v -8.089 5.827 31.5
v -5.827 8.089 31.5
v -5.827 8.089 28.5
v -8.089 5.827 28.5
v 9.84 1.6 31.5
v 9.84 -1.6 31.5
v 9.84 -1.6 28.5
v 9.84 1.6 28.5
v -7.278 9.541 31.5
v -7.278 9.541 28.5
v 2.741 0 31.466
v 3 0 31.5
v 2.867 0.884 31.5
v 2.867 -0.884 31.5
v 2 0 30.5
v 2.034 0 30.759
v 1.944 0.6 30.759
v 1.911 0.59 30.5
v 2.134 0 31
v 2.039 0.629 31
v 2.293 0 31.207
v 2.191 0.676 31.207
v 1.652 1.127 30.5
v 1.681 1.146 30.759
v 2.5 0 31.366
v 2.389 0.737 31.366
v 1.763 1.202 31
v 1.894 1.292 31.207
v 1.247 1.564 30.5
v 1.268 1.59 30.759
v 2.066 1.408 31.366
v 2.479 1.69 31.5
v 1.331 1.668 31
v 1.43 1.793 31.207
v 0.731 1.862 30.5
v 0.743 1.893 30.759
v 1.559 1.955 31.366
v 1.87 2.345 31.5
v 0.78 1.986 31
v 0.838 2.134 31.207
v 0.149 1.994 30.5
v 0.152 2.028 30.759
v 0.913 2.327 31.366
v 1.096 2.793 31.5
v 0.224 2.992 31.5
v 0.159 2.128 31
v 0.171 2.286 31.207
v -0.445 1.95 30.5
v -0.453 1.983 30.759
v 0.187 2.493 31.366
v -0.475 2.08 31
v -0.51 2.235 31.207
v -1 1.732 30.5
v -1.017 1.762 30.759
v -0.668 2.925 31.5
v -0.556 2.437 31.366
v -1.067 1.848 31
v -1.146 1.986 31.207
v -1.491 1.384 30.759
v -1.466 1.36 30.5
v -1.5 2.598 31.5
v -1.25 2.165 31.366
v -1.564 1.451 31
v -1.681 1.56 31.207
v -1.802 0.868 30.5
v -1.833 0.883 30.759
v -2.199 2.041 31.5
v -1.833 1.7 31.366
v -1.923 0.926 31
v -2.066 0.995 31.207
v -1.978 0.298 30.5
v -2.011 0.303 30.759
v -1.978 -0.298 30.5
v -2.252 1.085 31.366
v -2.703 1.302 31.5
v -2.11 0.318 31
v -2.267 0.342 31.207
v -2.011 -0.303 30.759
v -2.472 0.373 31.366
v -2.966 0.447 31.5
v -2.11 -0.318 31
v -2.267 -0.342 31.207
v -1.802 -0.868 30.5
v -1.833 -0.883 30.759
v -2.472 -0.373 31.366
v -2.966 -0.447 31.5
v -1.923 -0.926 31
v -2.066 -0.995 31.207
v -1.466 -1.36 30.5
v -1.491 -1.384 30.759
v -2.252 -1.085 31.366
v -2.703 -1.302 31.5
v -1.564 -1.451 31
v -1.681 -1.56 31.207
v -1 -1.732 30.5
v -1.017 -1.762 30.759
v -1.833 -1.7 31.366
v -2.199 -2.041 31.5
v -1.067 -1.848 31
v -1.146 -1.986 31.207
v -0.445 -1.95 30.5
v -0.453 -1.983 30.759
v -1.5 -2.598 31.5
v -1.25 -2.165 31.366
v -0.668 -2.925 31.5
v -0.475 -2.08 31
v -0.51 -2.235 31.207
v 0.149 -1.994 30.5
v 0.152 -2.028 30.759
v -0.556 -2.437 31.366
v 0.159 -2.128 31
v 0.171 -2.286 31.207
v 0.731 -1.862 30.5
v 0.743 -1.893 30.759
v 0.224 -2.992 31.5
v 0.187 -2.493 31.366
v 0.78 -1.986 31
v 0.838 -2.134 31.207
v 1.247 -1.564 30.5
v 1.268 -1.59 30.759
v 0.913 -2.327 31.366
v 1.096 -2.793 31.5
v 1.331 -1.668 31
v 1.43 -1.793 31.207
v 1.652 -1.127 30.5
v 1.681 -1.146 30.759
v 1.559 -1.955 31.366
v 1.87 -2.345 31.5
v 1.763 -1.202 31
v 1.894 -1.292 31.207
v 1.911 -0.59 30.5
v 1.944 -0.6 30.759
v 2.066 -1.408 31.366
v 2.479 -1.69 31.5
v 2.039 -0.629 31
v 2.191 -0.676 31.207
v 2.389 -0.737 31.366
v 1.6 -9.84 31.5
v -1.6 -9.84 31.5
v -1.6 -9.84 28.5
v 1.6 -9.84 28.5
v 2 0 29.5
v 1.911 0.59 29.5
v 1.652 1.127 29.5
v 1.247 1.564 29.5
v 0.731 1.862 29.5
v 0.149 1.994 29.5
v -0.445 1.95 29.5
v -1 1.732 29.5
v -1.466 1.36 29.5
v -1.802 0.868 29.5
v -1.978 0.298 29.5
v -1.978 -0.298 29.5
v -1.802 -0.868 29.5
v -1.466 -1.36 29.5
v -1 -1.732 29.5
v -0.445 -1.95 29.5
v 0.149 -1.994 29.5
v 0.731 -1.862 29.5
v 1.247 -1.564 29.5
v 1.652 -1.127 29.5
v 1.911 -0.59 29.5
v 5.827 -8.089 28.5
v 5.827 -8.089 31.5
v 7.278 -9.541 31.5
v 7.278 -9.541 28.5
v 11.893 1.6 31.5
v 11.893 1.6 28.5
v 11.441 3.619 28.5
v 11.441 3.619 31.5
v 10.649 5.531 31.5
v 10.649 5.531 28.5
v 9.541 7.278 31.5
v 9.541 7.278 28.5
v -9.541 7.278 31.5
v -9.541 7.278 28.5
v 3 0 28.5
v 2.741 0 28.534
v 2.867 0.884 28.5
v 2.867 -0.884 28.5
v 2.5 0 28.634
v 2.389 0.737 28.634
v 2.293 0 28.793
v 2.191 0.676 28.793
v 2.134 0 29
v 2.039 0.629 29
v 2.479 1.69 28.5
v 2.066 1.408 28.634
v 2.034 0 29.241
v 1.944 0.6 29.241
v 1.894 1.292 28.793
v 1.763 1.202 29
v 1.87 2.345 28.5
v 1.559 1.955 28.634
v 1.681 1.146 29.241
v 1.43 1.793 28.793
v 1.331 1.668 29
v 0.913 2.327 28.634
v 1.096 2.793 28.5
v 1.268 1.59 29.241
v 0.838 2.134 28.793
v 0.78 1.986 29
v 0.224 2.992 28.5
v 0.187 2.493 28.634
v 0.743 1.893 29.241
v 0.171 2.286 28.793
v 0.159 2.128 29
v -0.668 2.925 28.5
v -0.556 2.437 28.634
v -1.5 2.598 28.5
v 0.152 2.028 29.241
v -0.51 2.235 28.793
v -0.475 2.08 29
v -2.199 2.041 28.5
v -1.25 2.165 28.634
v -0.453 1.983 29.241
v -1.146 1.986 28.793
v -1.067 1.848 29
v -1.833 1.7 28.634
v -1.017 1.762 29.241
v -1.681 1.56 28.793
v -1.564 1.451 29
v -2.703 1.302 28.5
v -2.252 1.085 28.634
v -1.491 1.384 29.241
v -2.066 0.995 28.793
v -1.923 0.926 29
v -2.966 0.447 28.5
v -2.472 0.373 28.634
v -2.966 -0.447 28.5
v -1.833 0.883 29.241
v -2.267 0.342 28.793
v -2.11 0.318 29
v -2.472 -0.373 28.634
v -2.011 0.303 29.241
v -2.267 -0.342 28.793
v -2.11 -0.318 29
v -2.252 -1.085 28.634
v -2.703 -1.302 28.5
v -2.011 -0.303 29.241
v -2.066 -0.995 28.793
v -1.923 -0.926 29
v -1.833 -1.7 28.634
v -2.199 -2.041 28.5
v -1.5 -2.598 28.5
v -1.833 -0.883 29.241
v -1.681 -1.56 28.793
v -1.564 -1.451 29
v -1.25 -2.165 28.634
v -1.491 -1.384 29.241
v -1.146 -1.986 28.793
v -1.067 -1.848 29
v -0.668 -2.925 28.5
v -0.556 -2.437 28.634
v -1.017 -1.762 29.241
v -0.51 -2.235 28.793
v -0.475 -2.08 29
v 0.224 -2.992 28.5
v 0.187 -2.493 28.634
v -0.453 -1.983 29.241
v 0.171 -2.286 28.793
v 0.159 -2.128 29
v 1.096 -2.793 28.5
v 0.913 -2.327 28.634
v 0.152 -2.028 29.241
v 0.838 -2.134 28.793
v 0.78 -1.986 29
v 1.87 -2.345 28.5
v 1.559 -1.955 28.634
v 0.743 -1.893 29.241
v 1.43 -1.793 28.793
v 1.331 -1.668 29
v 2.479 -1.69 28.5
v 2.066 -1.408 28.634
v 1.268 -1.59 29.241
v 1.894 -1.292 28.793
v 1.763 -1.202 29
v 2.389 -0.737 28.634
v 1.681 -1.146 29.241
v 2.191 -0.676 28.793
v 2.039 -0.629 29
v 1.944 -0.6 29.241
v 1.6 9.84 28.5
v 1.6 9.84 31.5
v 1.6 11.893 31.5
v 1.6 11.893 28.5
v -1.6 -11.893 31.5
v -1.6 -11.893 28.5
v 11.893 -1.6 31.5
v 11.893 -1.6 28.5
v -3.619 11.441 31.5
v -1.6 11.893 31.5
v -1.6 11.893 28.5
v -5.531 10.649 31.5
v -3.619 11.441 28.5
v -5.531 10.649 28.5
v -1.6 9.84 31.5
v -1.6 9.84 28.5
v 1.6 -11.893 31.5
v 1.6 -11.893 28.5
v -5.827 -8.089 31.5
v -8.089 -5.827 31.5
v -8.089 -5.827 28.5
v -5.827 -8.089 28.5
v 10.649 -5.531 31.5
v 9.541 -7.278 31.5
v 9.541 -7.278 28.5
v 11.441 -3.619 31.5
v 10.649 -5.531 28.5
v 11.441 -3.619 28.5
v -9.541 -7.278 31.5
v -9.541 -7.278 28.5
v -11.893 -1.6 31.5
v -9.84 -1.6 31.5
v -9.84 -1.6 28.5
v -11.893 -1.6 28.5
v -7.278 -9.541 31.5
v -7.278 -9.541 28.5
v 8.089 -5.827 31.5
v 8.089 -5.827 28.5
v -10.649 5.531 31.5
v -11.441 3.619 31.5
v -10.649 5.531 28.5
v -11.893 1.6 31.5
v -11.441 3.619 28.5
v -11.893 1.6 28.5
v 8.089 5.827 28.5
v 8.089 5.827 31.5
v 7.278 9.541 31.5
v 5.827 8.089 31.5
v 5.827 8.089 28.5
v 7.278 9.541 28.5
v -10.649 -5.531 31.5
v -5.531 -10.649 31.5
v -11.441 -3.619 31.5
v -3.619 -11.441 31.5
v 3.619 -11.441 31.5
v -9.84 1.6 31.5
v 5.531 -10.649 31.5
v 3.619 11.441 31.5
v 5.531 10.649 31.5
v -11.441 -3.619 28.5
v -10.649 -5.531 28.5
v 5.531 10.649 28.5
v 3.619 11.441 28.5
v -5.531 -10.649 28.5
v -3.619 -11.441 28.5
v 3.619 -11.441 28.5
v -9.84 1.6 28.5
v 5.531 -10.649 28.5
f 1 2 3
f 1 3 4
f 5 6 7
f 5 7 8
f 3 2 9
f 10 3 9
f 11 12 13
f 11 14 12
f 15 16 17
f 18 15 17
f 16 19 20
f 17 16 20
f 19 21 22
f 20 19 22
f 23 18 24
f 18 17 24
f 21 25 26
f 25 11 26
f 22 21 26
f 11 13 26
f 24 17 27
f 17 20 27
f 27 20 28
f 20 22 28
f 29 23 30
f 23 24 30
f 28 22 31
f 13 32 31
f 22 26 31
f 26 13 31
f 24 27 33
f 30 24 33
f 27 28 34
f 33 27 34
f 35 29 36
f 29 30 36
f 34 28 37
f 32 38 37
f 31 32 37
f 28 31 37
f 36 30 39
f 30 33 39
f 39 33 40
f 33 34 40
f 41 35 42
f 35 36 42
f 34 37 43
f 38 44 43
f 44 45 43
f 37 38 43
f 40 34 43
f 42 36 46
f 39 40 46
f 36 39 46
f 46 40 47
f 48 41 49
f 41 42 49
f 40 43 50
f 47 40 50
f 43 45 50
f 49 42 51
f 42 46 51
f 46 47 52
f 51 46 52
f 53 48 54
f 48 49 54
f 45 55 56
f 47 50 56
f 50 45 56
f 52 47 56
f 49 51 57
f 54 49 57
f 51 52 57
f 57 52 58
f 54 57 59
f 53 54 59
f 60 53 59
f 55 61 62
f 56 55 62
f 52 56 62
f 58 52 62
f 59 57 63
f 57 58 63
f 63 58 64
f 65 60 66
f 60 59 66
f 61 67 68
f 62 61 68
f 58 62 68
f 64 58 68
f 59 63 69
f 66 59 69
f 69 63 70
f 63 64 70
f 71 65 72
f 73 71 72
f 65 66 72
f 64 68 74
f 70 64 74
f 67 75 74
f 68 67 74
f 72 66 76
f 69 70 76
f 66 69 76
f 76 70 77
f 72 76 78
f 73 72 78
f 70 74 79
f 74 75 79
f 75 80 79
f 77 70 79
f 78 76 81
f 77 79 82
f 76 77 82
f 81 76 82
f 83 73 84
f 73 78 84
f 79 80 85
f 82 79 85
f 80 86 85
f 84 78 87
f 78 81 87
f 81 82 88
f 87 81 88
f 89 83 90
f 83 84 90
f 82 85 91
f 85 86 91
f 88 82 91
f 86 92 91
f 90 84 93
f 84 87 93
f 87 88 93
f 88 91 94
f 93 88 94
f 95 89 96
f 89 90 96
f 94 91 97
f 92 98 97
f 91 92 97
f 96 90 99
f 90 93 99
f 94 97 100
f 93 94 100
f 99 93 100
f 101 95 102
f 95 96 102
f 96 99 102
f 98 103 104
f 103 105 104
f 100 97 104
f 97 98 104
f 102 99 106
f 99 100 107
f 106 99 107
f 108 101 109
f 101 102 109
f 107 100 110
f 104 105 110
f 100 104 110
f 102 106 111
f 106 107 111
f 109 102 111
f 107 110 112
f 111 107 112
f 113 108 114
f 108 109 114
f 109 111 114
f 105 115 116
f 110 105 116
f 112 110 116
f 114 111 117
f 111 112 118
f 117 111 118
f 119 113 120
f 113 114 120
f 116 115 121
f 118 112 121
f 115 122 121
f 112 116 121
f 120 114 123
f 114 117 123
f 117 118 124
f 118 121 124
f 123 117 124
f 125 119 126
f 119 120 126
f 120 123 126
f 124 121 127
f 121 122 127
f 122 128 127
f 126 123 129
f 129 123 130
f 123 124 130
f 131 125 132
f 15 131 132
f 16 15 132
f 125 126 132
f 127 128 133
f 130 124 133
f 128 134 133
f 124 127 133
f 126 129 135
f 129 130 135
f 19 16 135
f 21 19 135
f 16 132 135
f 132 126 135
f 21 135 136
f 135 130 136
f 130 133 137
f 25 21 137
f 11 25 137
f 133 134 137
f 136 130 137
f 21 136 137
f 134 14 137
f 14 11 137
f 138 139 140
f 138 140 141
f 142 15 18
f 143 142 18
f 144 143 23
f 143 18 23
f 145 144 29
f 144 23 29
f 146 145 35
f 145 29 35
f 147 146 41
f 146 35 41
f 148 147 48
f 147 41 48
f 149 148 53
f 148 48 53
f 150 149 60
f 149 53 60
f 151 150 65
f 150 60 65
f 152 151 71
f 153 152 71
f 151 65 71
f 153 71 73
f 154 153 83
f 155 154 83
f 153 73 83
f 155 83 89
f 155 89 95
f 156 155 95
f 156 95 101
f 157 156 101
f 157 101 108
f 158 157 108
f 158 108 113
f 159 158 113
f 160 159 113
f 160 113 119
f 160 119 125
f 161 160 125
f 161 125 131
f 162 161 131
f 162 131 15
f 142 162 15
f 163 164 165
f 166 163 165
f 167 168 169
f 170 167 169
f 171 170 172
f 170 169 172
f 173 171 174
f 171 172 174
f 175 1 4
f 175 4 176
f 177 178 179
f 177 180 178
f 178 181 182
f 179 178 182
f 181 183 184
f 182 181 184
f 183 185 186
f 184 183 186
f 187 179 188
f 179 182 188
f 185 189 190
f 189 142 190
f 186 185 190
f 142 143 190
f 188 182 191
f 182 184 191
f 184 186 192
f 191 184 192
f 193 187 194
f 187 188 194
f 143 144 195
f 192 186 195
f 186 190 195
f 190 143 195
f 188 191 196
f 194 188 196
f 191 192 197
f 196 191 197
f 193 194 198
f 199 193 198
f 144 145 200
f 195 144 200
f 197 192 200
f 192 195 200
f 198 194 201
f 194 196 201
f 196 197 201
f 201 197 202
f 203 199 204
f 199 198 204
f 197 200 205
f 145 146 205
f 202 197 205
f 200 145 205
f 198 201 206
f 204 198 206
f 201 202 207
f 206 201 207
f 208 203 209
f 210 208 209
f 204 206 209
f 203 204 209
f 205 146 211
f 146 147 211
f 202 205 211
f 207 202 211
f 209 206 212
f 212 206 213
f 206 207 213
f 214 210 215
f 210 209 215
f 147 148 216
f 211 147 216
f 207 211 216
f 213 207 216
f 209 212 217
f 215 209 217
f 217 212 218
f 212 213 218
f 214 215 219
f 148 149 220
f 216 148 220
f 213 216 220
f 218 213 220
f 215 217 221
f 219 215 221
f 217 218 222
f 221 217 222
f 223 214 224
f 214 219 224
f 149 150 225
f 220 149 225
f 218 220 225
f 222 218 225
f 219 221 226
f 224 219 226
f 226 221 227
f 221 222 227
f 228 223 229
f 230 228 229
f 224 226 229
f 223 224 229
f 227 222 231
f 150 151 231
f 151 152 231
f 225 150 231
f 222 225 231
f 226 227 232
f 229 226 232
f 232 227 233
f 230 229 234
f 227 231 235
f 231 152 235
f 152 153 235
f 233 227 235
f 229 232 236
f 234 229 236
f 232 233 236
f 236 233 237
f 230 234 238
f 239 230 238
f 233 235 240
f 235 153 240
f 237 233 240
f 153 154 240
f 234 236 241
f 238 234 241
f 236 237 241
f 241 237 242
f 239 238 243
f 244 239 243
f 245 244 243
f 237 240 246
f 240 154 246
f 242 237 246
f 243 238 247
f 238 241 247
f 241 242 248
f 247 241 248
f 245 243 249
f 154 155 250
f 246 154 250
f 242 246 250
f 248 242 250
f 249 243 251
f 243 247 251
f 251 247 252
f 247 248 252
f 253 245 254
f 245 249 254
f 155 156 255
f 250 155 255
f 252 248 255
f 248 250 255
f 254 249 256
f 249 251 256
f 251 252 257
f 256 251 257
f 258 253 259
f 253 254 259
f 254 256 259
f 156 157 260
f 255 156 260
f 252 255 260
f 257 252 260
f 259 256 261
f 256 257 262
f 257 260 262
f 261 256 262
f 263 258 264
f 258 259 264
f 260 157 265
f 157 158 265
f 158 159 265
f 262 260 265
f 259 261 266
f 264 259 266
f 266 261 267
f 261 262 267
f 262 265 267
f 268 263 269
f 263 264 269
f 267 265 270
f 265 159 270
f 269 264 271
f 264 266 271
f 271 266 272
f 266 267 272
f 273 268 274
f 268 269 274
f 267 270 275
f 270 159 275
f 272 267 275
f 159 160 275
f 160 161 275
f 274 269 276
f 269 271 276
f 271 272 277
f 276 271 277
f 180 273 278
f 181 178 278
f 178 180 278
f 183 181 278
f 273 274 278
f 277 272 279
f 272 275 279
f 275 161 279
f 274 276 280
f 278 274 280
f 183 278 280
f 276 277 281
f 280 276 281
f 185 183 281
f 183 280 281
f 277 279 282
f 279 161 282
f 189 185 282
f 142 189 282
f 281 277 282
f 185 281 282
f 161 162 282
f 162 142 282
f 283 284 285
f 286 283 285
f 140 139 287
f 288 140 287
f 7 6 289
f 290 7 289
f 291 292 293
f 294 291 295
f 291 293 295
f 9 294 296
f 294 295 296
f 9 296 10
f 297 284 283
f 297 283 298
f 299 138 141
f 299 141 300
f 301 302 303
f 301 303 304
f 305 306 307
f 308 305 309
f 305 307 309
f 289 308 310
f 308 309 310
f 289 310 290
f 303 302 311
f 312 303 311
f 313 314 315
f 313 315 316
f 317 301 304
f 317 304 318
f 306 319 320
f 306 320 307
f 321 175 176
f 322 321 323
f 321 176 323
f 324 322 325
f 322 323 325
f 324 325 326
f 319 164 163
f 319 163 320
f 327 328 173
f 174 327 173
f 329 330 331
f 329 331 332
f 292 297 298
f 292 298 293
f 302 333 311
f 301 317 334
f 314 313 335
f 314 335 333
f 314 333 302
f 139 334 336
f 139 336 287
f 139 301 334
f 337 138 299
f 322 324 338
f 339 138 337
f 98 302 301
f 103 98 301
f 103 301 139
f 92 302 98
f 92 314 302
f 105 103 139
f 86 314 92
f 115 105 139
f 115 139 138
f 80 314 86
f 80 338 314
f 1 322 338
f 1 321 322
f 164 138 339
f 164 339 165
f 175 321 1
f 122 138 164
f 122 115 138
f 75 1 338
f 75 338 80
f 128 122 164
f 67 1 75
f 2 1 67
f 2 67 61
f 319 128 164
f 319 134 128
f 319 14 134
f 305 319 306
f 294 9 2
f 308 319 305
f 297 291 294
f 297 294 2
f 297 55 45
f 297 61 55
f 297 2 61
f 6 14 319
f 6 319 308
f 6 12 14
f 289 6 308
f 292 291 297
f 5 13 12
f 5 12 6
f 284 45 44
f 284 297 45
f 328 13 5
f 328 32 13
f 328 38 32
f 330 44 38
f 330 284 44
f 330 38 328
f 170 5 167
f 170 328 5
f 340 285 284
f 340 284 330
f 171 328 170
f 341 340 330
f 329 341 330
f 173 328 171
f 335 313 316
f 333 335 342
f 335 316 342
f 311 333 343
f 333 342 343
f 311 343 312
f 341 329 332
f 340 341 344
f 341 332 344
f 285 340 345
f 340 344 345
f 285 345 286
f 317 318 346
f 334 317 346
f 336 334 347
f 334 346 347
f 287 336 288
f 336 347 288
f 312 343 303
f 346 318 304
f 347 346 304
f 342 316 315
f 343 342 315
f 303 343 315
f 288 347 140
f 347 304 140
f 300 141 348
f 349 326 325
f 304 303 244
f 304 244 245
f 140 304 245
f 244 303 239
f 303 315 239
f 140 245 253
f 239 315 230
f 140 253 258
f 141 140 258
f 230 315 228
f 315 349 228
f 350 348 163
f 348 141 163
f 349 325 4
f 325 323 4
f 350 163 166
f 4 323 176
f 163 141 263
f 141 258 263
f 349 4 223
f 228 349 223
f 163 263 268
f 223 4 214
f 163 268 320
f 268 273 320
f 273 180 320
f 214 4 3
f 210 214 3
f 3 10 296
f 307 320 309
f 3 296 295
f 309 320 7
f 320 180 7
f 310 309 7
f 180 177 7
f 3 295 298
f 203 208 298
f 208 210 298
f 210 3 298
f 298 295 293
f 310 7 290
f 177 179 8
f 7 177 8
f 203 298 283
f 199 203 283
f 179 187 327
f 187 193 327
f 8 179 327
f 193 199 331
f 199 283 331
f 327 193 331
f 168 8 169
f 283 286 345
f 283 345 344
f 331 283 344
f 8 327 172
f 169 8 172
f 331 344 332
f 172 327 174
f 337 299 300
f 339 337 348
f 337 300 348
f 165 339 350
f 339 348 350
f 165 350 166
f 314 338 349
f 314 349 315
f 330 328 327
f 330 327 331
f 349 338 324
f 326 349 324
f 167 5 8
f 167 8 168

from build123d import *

# Parameters (mm, degrees)
SKETCH001_R        = 12
PAD001_DEPTH       = 3
SKETCH002_W        = 2.57
SKETCH002_H        = 3.2
POCKET_DEPTH       = 5
POLARPATTERN_COUNT = 8
SKETCH003_R        = 2
POCKET001_DEPTH    = 6
FILLET_R           = 1
FILLET002_R        = 1


with BuildPart() as part:
    # Sketch001 → Pad001 (new body)
    with BuildSketch(Plane.XY.offset(28.5)):
        Circle(SKETCH001_R)
    extrude(amount=PAD001_DEPTH)

    # Sketch002 (on Face3 of Pad001) → Pocket (cut)
    with BuildSketch(Plane.XY.offset(31.5)):
        with Locations((11.125, 0)):
            Rectangle(SKETCH002_W, SKETCH002_H)
    pocket = extrude(amount=-POCKET_DEPTH, mode=Mode.SUBTRACT)

    # PolarPattern: Pocket ×8 about axis
    polarpattern_axis = Axis((0, 0, 31.5), (0, 0, 1))
    for i in range(1, POLARPATTERN_COUNT):
        add(pocket.rotate(polarpattern_axis, i * 360 / POLARPATTERN_COUNT), mode=Mode.SUBTRACT)

    # Sketch003 (on Face4 of PolarPattern) → Pocket001 (cut)
    with BuildSketch(Plane.XY.offset(31.5)):
        Circle(SKETCH003_R)
    extrude(amount=-POCKET001_DEPTH, mode=Mode.SUBTRACT)

    # Fillet
    fillet_edges = [part.edges().sort_by_distance(p)[0] for p in [
        (-2, 0, 28.5),
    ]]
    fillet(fillet_edges, radius=FILLET_R)

    # Fillet002
    fillet002_edges = [part.edges().sort_by_distance(p)[0] for p in [
        (-2, 0, 31.5),
    ]]
    fillet(fillet002_edges, radius=FILLET002_R)


solid = part.part
